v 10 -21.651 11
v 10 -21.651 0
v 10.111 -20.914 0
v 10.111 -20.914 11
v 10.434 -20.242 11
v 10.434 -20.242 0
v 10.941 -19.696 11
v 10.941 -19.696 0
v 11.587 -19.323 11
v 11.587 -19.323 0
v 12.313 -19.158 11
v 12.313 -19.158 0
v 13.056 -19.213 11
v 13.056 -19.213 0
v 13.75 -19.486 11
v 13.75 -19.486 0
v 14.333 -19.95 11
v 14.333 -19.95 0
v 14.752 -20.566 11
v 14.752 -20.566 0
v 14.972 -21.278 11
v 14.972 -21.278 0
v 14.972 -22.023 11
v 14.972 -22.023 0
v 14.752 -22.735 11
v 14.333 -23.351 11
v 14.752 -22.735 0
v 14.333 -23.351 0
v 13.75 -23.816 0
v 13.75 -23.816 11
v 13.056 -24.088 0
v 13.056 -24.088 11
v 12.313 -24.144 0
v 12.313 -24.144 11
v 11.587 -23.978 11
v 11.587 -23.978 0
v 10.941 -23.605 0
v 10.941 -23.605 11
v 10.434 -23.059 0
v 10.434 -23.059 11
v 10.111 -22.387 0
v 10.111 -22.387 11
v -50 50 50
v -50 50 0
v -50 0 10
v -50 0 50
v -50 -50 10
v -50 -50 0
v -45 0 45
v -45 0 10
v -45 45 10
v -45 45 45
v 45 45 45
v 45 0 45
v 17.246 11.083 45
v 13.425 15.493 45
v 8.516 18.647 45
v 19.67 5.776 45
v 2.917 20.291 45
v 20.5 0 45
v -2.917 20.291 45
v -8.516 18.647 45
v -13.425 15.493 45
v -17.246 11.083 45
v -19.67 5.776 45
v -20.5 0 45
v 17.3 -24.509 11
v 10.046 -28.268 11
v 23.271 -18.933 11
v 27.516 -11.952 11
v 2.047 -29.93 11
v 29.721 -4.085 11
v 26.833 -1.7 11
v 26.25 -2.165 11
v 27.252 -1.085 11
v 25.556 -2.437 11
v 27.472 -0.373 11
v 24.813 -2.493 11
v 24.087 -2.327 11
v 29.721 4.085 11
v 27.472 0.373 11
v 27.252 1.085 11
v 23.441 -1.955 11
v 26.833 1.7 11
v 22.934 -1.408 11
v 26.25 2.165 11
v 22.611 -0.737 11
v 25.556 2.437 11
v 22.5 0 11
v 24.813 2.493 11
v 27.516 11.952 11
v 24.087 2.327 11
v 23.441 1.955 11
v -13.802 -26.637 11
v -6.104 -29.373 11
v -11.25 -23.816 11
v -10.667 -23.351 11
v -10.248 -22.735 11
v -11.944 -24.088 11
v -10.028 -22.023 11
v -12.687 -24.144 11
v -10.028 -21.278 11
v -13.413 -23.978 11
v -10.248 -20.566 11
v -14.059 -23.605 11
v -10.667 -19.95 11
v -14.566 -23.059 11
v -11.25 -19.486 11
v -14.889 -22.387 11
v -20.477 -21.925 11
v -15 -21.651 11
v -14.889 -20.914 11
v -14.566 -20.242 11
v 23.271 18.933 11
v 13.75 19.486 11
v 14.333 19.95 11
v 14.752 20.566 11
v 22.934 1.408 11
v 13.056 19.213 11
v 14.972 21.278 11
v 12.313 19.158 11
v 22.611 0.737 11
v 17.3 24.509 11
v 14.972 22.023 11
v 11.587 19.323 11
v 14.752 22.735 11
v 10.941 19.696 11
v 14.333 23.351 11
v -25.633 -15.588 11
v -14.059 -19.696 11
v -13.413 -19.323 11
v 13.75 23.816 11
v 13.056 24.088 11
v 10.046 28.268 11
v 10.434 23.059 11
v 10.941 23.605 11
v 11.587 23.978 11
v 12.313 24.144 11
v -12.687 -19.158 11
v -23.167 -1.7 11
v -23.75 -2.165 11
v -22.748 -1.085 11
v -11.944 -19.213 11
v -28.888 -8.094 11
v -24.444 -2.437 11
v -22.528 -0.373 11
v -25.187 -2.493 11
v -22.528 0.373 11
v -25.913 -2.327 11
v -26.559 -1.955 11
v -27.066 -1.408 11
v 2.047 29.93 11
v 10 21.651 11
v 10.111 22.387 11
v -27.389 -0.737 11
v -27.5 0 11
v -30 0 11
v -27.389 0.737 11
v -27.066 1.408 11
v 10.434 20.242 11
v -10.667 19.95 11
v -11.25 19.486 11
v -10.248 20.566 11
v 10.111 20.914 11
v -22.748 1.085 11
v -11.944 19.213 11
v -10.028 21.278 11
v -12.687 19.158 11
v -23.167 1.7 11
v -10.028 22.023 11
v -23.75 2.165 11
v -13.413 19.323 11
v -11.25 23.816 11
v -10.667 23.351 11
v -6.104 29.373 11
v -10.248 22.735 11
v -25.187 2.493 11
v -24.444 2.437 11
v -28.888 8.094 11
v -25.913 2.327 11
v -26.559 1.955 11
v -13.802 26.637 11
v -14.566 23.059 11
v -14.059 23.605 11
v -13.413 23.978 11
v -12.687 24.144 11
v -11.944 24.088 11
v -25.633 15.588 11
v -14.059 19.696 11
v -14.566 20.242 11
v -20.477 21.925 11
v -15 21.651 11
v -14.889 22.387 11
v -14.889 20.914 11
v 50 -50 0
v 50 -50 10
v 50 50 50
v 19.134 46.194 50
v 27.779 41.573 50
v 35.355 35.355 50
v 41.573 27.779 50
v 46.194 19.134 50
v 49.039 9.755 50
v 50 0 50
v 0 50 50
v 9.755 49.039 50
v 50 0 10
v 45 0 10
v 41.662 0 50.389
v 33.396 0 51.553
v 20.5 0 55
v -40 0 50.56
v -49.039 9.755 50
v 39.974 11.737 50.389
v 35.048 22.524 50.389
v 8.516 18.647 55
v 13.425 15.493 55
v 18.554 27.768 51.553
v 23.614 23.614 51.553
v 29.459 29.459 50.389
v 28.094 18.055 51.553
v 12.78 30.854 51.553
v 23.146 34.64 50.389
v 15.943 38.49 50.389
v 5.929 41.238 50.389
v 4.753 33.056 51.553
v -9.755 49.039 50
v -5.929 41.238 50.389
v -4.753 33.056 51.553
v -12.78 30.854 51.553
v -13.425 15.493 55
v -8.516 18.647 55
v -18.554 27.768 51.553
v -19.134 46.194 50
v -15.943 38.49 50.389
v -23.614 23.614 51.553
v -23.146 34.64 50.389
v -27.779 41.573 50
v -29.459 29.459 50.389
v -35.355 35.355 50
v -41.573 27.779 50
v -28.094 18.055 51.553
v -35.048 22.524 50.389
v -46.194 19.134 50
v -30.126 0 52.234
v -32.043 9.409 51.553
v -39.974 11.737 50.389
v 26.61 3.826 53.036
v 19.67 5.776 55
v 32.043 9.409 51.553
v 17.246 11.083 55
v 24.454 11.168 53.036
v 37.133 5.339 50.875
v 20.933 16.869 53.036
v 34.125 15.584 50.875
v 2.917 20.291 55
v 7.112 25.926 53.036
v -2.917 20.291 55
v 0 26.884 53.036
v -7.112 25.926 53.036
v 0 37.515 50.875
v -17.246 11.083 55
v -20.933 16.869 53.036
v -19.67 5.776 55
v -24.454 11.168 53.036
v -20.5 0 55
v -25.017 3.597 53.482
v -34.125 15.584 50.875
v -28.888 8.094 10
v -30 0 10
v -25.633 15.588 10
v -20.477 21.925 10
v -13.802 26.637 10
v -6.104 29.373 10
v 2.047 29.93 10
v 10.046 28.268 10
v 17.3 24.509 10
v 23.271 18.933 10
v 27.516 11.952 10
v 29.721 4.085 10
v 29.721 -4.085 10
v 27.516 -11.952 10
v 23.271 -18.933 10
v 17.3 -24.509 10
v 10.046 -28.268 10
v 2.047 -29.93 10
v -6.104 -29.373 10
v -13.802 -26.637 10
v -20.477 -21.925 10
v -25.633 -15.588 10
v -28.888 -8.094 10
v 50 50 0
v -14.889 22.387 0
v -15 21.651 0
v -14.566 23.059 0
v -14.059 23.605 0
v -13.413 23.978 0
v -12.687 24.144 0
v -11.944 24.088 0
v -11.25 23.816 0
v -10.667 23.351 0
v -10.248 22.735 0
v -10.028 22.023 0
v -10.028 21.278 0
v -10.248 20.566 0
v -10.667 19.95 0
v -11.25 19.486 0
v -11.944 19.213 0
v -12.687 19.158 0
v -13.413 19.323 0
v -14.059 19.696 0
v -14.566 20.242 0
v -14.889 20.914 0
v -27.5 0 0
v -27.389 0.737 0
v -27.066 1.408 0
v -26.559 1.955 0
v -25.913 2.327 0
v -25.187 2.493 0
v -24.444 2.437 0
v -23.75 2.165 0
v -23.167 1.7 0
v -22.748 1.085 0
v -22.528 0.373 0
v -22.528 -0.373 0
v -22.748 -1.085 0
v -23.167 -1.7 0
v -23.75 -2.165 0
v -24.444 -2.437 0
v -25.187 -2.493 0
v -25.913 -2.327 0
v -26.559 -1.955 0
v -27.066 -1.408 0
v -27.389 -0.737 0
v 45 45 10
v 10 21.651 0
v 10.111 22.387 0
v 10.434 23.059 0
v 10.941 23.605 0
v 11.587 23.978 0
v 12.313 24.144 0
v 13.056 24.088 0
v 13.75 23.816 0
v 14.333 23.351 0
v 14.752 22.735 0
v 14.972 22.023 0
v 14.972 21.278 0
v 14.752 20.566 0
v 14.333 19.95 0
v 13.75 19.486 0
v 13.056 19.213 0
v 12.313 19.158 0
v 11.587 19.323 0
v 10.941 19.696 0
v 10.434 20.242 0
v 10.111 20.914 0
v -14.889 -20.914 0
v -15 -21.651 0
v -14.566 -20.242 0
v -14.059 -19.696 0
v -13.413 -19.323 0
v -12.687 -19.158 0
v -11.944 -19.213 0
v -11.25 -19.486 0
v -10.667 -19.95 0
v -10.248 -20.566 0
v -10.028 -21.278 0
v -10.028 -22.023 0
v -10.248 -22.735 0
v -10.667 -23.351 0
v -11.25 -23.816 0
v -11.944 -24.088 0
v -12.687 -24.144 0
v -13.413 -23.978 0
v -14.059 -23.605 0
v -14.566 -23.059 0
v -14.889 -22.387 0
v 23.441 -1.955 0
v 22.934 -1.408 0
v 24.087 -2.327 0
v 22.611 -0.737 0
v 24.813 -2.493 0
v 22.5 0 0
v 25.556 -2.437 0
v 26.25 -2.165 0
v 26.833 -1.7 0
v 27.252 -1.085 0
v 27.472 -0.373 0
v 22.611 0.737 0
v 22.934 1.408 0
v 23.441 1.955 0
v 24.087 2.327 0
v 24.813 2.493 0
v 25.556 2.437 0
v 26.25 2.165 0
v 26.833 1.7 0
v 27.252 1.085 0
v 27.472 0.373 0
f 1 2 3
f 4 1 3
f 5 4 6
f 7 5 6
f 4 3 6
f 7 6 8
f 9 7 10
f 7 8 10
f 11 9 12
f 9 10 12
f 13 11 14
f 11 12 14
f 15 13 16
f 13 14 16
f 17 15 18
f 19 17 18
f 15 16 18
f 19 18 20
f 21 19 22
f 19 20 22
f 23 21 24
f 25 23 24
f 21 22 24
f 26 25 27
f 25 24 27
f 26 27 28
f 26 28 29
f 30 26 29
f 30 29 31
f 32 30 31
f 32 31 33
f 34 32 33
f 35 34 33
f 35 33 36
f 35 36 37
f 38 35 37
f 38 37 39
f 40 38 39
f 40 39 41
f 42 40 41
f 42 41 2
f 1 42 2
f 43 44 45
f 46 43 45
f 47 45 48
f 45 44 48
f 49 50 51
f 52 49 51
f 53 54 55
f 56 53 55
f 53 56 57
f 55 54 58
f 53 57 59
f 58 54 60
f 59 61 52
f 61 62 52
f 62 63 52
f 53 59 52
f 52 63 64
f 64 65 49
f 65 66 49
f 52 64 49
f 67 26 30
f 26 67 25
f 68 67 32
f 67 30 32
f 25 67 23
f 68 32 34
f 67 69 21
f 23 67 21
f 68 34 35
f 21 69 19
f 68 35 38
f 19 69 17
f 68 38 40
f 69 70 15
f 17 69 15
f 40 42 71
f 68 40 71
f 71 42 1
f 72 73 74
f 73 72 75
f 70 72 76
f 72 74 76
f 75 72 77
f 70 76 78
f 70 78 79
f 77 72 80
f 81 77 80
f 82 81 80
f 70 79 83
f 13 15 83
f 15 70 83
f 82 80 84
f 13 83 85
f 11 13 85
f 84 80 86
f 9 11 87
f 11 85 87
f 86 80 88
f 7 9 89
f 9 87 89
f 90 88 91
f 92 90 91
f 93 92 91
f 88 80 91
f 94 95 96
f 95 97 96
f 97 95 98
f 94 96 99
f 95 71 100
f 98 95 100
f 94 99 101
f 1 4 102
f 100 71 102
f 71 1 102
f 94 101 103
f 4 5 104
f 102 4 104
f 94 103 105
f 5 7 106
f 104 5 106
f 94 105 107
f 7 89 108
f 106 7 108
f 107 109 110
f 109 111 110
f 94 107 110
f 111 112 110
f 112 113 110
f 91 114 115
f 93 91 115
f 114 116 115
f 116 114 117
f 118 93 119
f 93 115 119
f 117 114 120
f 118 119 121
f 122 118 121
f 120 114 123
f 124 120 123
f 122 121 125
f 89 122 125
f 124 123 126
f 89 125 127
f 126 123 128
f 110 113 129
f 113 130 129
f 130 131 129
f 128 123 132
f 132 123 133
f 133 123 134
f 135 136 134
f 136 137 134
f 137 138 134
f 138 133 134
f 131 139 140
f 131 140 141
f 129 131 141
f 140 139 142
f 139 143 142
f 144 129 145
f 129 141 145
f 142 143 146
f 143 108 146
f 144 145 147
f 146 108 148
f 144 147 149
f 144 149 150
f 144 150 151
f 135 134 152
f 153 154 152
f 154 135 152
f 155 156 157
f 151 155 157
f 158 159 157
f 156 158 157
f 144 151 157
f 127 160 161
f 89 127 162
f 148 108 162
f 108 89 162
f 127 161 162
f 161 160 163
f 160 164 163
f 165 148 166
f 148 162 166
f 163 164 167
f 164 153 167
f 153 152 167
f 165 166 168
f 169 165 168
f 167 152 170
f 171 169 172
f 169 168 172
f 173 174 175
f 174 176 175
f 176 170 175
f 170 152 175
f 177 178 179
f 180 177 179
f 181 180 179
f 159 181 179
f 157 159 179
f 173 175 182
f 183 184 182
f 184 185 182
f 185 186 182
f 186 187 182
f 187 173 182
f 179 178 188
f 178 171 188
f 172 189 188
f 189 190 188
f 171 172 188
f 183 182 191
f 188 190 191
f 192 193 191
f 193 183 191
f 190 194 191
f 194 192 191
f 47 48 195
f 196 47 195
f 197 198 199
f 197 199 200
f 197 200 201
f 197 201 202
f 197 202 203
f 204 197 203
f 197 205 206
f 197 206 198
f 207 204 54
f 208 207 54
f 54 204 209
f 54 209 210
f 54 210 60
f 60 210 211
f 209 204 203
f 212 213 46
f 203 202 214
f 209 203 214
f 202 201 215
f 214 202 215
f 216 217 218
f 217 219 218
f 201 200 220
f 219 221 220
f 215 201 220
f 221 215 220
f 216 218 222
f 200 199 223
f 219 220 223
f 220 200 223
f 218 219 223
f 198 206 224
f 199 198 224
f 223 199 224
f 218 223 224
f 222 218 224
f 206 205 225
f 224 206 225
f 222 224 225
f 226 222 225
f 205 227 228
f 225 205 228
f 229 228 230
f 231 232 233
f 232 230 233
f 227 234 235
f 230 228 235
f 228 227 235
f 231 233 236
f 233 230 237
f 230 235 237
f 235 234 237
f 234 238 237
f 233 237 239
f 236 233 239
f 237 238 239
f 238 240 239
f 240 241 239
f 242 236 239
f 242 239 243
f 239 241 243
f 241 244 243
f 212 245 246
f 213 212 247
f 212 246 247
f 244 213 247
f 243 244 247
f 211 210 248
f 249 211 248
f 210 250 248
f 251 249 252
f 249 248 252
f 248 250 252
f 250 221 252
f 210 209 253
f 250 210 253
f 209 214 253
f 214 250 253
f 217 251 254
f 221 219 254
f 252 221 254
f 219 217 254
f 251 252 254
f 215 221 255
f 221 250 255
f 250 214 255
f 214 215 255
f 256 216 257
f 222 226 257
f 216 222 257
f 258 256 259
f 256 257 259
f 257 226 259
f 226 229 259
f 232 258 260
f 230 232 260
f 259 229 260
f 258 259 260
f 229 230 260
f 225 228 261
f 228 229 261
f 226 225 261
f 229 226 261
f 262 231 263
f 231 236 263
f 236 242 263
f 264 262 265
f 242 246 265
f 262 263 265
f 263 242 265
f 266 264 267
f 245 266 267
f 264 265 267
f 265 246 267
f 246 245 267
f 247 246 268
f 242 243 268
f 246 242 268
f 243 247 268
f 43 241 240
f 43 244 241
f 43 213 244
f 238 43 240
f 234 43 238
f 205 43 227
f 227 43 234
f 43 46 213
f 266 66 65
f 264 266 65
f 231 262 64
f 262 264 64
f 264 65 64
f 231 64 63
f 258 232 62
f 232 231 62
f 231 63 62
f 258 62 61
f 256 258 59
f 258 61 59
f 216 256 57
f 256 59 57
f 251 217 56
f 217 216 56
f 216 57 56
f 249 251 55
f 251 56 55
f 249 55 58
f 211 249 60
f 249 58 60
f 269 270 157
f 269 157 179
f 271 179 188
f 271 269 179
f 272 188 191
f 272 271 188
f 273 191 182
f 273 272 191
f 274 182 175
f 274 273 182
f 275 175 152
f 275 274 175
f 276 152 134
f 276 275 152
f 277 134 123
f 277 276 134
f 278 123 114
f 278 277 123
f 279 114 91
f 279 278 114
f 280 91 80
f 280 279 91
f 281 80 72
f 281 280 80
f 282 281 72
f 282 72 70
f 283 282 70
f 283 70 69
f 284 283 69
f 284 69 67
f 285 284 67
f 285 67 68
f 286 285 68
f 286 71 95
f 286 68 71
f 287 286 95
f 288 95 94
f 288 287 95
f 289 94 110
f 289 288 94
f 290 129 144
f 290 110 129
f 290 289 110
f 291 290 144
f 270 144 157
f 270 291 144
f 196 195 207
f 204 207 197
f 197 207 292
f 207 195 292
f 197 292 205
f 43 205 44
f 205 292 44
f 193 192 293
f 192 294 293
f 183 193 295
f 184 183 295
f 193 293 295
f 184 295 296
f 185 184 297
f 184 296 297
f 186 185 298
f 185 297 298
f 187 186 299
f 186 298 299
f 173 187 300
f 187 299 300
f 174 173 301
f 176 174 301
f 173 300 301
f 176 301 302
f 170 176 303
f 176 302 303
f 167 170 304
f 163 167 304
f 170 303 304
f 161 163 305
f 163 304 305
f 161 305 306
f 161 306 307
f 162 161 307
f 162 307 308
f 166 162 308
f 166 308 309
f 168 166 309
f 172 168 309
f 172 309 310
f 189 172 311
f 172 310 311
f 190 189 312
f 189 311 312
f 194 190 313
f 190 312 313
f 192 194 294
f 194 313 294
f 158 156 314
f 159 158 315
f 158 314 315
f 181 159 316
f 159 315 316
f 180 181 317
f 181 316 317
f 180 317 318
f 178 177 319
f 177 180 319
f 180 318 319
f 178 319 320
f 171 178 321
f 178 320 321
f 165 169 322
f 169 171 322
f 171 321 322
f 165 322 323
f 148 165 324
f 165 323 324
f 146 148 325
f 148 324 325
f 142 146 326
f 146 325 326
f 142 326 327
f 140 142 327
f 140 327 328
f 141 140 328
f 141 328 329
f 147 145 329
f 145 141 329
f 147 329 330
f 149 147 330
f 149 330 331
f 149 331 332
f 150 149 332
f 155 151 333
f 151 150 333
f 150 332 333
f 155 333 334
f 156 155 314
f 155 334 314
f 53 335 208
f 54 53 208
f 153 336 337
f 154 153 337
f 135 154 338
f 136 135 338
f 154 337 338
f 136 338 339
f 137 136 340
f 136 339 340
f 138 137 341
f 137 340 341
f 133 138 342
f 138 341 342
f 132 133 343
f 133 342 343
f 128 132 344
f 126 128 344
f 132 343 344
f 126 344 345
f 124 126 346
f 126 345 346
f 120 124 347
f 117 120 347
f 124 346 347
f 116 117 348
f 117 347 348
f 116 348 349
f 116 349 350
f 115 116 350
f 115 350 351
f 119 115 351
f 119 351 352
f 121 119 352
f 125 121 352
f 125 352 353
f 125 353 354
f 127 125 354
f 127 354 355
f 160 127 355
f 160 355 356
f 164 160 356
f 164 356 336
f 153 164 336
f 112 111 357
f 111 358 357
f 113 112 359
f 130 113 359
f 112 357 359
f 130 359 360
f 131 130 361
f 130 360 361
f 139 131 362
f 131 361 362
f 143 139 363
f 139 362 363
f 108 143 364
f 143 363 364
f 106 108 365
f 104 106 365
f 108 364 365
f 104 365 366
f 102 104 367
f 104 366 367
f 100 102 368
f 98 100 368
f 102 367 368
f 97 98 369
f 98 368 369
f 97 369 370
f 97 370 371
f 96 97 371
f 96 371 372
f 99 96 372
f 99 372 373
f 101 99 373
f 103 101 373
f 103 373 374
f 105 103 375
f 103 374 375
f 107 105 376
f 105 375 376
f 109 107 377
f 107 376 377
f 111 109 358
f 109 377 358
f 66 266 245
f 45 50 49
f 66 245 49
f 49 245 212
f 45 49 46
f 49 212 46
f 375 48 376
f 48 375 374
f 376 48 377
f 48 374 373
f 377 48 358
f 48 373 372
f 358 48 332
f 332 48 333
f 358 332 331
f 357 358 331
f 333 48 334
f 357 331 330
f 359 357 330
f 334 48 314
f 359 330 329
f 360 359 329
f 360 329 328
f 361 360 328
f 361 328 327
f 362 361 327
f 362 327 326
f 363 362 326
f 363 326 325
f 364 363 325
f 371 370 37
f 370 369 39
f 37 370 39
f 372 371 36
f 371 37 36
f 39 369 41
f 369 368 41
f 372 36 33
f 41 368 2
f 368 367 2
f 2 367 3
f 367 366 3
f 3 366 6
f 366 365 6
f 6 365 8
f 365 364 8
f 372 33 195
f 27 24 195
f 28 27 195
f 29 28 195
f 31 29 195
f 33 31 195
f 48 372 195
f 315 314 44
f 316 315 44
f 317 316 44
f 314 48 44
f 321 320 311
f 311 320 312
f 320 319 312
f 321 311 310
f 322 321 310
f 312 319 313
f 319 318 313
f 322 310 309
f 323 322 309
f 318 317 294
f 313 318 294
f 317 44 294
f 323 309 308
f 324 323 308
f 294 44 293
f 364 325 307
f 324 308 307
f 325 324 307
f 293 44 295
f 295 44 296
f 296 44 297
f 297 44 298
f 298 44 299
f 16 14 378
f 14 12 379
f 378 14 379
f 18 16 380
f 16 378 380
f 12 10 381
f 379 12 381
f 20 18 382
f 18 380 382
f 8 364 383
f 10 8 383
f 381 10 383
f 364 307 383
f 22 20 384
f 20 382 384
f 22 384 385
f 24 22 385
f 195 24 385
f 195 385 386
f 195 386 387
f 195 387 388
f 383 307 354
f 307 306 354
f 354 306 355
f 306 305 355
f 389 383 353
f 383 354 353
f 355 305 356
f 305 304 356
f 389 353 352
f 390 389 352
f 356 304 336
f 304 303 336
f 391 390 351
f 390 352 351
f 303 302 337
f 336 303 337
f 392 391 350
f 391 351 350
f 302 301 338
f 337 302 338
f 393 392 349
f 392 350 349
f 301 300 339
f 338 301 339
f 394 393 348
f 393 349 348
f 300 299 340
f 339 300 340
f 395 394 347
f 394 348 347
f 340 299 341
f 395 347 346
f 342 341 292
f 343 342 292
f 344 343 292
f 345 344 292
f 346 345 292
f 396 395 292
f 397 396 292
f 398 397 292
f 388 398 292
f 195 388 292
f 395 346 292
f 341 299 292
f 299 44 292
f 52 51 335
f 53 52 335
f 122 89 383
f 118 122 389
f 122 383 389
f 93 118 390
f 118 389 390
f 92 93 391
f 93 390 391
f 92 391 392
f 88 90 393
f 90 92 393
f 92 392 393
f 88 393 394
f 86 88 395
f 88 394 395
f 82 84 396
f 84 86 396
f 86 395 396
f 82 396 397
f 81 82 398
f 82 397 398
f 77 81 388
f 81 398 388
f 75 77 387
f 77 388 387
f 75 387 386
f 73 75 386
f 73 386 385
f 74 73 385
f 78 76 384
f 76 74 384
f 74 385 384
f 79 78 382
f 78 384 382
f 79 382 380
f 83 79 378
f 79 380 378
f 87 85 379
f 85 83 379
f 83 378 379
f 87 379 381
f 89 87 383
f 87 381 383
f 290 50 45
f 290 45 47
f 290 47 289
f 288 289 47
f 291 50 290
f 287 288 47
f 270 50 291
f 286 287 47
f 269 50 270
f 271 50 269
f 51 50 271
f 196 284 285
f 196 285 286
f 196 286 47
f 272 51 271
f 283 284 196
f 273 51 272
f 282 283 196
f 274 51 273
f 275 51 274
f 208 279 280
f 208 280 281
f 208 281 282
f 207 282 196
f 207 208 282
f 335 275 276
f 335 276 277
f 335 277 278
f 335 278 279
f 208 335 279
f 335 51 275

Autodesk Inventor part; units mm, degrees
ref_plane "YZ Plane" through (0, 0, 0) normal (1, 0, 0) x (0, 1, 0)
ref_plane "XZ Plane" through (0, 0, 0) normal (0, 1, 0) x (-1, 0, 0)
ref_plane "XY Plane" through (0, 0, 0) normal (0, 0, 1) x (1, 0, 0)
sketch "Sketch1" plane through (0, 0, 0) normal (0, 0, 1) x (1, 0, 0)
  circle A0 centre (0, 0) radius 30
  line L0 (50, -50) -> (-50, -50)
  line L1 (-50, -50) -> (-50, 50)
  line L2 (-50, 50) -> (50, 50)
  line L3 (50, 50) -> (50, -50)
  line L4 (50, -50) -> (-50, 50) construction
  line L5 (-50, -50) -> (50, 50) construction
  dimension "d2" = 60
  dimension "d30" = 100
  dimension "d31" = 100
extrude "Extrusion1" add sketch "Sketch1" along normal blind 10 contours A0 | L0 L1 L2 L3
sketch "Sketch2" plane through (0, 0, 0) normal (0, 0, -1) x (-1, 0, 0)
  circle A0 centre (0, 0) radius 25 construction
  line L0 (0, 0) -> (-12.5, 21.6506) construction
  line L1 (0, 0) -> (25, 0) construction
  line L2 (0, 0) -> (-25, 0) construction
  line L3 (0, 0) -> (12.5, -21.6506) construction
  line L4 (0, 0) -> (12.5, 21.6506) construction
  line L5 (0, 0) -> (-12.5, -21.6506) construction
  circle A1 centre (12.5, 21.6506) radius 2.5
  circle A2 centre (-12.5, 21.6506) radius 2.5
  circle A3 centre (-25, 0) radius 2.5
  circle A4 centre (-12.5, -21.6506) radius 2.5
  circle A5 centre (12.5, -21.6506) radius 2.5
  circle A6 centre (25, 0) radius 2.5
  dimension "d3" = 50
  dimension "d4" = 60
  dimension "d5" = 60
  dimension "d6" = 60
  dimension "d7" = 60
  dimension "d8" = 60
  dimension "d9" = 5
  dimension "d10" = 5
  dimension "d11" = 5
  dimension "d12" = 5
  dimension "d13" = 5
  dimension "d14" = 5
extrude "Extrusion2" cut sketch "Sketch2" against normal through all
sketch "Sketch8" plane through (0, 0, 0) normal (0, 0, -1) x (-1, 0, 0)
  circle A0 centre (0, 0) radius 30
  circle A1 centre (-12.5, 21.6506) radius 2.5 projected
  circle A2 centre (-25, 0) radius 2.5 projected
  circle A3 centre (-12.5, -21.6506) radius 2.5 projected
  circle A4 centre (12.5, -21.6506) radius 2.5 projected
  circle A5 centre (25, 0) radius 2.5 projected
  circle A6 centre (12.5, 21.6506) radius 2.5 projected
  dimension "d34" = 60
extrude "Extrusion5" add sketch "Sketch8" against normal blind 11
sketch "Sketch9" plane through (0, 0, 10) normal (0, 0, 1) x (1, 0, 0)
  circle A0 centre (0, 0) radius 30 projected
  line L0 (50, 50) -> (-50, 50) projected
  line L1 (-50, 50) -> (-50, -50) projected
  line L2 (-50, -50) -> (50, -50) projected
  line L3 (50, -50) -> (50, 50) projected
  line L4 (-45, -45) -> (-45, 45)
  line L5 (-45, 45) -> (45, 45)
  line L6 (45, 45) -> (45, -45)
  line L7 (45, -45) -> (-45, -45)
  dimension "d37" = 5
extrude "Extrusion6" add sketch "Sketch9" along normal blind 40 contours L3 L2 L1 L0
sketch "Sketch10" plane through (0, 0, 50) normal (0, 0, 1) x (1, 0, 0)
  circle A0 centre (0, 0) radius 20.5
  dimension "d40" = 41
sketch "Sketch11" plane through (0, 0, 0) normal (0, 1, 0) x (-1, 0, 0)
  line L0 (45, 50) -> (-45, 50) projected
  line L1 (0, 50) -> (0, 55)
  line L2 (-50, 50) -> (50, 50) projected
  line L3 (-20.5, 55) -> (20.5, 55)
  arc A0 (20.5, 55) -> (50, 50) centre (50, 139.525) ccw
  arc A1 (-50, 50) -> (-20.5, 55) centre (-50, 139.525) ccw
  line L4 (20.5, 55) -> (20.5, 50)
  line L5 (20.5, 50) -> (20.5, 45)
  line L6 (20.5, 45) -> (50, 45)
  line L7 (50, 45) -> (50, 50)
  point P0 (0, 0)
  dimension "d41" = 5
  dimension "d42" = 41
  dimension "d43" = 5
revolve "Revolution2" add sketch "Sketch11" angle 360 about axis through (0, 0, 50) along (0, 0, 1) contours L2 L7 L6 L5 L0 | L0 L4 A0 L2
sketch "Sketch12" plane through (0, 0, 50) normal (0, 0, 1) x (1, 0, 0)
  arc A0 (-21.7945, 45) -> (-45, 21.7945) centre (0, 0) ccw projected
  line L0 (-45, -45) -> (45, -45) projected
  line L1 (45, -45) -> (45, 45) projected
  line L2 (45, 45) -> (-45, 45) projected
  line L3 (-45, 45) -> (-45, -45) projected
  circle A1 centre (0, 0) radius 30 projected
  arc A2 (45, 21.7945) -> (21.7945, 45) centre (0, 0) ccw projected
  arc A3 (21.7945, -45) -> (45, -21.7945) centre (0, 0) ccw projected
  arc A4 (-45, -21.7945) -> (-21.7945, -45) centre (0, 0) ccw projected
  point P0 (-45, 21.7945)
  point P1 (-21.7945, 45)
extrude "Extrusion7" add sketch "Sketch12" against normal blind 5 contours A0 L3 L2 | L2 L1 A2 | A4 L0 L3 | L1 L0 A3
sketch "Sketch13" plane through (0, 0, 0) normal (0, 1, 0) x (-1, 0, 0)
  line L0 (45, 10) -> (45, 45) projected
  line L1 (45, 10) -> (50, 10)
  line L2 (50, 0) -> (50, 50) projected
  line L3 (50, 10) -> (50, 79.5964)
  line L4 (50, 79.5964) -> (-50, 79.5964)
  line L5 (-45, 10) -> (-45, 45) projected
  line L6 (-45, 10) -> (-50, 10)
  line L7 (-50, 0) -> (-50, 50) projected
  line L8 (-50, 10) -> (-50, 79.5964)
  line L9 (-45, 10) -> (45, 10) projected
  line L10 (30, 11) -> (-30, 11) projected
  line L11 (30, 10) -> (30, 11) projected
  line L12 (-30, 10) -> (-30, 11) projected
  point P0 (0, 0)
  dimension "d47" = 100
extrude "Extrusion8" cut sketch "Sketch13" against normal through all contours L9 L11 L10 L12 L6 L7 L8 L4 L3 L2 L1
sketch "Sketch14" plane through (-50, -50, 0) normal (0, -1, 0) x (1, 0, 0)
  line L0 (80, 11) -> (20, 11) projected
  line L1 (100, 10) -> (80, 10) projected
  line L2 (20, 11) -> (80, 11)
  line L3 (80, 11) -> (80, 10)
  line L4 (80, 10) -> (20, 10)
  line L5 (20, 10) -> (20, 11)
  point P0 (50, 0)
extrude "Extrusion9" cut sketch "Sketch14" against normal blind 10
properties part number "soporte"
